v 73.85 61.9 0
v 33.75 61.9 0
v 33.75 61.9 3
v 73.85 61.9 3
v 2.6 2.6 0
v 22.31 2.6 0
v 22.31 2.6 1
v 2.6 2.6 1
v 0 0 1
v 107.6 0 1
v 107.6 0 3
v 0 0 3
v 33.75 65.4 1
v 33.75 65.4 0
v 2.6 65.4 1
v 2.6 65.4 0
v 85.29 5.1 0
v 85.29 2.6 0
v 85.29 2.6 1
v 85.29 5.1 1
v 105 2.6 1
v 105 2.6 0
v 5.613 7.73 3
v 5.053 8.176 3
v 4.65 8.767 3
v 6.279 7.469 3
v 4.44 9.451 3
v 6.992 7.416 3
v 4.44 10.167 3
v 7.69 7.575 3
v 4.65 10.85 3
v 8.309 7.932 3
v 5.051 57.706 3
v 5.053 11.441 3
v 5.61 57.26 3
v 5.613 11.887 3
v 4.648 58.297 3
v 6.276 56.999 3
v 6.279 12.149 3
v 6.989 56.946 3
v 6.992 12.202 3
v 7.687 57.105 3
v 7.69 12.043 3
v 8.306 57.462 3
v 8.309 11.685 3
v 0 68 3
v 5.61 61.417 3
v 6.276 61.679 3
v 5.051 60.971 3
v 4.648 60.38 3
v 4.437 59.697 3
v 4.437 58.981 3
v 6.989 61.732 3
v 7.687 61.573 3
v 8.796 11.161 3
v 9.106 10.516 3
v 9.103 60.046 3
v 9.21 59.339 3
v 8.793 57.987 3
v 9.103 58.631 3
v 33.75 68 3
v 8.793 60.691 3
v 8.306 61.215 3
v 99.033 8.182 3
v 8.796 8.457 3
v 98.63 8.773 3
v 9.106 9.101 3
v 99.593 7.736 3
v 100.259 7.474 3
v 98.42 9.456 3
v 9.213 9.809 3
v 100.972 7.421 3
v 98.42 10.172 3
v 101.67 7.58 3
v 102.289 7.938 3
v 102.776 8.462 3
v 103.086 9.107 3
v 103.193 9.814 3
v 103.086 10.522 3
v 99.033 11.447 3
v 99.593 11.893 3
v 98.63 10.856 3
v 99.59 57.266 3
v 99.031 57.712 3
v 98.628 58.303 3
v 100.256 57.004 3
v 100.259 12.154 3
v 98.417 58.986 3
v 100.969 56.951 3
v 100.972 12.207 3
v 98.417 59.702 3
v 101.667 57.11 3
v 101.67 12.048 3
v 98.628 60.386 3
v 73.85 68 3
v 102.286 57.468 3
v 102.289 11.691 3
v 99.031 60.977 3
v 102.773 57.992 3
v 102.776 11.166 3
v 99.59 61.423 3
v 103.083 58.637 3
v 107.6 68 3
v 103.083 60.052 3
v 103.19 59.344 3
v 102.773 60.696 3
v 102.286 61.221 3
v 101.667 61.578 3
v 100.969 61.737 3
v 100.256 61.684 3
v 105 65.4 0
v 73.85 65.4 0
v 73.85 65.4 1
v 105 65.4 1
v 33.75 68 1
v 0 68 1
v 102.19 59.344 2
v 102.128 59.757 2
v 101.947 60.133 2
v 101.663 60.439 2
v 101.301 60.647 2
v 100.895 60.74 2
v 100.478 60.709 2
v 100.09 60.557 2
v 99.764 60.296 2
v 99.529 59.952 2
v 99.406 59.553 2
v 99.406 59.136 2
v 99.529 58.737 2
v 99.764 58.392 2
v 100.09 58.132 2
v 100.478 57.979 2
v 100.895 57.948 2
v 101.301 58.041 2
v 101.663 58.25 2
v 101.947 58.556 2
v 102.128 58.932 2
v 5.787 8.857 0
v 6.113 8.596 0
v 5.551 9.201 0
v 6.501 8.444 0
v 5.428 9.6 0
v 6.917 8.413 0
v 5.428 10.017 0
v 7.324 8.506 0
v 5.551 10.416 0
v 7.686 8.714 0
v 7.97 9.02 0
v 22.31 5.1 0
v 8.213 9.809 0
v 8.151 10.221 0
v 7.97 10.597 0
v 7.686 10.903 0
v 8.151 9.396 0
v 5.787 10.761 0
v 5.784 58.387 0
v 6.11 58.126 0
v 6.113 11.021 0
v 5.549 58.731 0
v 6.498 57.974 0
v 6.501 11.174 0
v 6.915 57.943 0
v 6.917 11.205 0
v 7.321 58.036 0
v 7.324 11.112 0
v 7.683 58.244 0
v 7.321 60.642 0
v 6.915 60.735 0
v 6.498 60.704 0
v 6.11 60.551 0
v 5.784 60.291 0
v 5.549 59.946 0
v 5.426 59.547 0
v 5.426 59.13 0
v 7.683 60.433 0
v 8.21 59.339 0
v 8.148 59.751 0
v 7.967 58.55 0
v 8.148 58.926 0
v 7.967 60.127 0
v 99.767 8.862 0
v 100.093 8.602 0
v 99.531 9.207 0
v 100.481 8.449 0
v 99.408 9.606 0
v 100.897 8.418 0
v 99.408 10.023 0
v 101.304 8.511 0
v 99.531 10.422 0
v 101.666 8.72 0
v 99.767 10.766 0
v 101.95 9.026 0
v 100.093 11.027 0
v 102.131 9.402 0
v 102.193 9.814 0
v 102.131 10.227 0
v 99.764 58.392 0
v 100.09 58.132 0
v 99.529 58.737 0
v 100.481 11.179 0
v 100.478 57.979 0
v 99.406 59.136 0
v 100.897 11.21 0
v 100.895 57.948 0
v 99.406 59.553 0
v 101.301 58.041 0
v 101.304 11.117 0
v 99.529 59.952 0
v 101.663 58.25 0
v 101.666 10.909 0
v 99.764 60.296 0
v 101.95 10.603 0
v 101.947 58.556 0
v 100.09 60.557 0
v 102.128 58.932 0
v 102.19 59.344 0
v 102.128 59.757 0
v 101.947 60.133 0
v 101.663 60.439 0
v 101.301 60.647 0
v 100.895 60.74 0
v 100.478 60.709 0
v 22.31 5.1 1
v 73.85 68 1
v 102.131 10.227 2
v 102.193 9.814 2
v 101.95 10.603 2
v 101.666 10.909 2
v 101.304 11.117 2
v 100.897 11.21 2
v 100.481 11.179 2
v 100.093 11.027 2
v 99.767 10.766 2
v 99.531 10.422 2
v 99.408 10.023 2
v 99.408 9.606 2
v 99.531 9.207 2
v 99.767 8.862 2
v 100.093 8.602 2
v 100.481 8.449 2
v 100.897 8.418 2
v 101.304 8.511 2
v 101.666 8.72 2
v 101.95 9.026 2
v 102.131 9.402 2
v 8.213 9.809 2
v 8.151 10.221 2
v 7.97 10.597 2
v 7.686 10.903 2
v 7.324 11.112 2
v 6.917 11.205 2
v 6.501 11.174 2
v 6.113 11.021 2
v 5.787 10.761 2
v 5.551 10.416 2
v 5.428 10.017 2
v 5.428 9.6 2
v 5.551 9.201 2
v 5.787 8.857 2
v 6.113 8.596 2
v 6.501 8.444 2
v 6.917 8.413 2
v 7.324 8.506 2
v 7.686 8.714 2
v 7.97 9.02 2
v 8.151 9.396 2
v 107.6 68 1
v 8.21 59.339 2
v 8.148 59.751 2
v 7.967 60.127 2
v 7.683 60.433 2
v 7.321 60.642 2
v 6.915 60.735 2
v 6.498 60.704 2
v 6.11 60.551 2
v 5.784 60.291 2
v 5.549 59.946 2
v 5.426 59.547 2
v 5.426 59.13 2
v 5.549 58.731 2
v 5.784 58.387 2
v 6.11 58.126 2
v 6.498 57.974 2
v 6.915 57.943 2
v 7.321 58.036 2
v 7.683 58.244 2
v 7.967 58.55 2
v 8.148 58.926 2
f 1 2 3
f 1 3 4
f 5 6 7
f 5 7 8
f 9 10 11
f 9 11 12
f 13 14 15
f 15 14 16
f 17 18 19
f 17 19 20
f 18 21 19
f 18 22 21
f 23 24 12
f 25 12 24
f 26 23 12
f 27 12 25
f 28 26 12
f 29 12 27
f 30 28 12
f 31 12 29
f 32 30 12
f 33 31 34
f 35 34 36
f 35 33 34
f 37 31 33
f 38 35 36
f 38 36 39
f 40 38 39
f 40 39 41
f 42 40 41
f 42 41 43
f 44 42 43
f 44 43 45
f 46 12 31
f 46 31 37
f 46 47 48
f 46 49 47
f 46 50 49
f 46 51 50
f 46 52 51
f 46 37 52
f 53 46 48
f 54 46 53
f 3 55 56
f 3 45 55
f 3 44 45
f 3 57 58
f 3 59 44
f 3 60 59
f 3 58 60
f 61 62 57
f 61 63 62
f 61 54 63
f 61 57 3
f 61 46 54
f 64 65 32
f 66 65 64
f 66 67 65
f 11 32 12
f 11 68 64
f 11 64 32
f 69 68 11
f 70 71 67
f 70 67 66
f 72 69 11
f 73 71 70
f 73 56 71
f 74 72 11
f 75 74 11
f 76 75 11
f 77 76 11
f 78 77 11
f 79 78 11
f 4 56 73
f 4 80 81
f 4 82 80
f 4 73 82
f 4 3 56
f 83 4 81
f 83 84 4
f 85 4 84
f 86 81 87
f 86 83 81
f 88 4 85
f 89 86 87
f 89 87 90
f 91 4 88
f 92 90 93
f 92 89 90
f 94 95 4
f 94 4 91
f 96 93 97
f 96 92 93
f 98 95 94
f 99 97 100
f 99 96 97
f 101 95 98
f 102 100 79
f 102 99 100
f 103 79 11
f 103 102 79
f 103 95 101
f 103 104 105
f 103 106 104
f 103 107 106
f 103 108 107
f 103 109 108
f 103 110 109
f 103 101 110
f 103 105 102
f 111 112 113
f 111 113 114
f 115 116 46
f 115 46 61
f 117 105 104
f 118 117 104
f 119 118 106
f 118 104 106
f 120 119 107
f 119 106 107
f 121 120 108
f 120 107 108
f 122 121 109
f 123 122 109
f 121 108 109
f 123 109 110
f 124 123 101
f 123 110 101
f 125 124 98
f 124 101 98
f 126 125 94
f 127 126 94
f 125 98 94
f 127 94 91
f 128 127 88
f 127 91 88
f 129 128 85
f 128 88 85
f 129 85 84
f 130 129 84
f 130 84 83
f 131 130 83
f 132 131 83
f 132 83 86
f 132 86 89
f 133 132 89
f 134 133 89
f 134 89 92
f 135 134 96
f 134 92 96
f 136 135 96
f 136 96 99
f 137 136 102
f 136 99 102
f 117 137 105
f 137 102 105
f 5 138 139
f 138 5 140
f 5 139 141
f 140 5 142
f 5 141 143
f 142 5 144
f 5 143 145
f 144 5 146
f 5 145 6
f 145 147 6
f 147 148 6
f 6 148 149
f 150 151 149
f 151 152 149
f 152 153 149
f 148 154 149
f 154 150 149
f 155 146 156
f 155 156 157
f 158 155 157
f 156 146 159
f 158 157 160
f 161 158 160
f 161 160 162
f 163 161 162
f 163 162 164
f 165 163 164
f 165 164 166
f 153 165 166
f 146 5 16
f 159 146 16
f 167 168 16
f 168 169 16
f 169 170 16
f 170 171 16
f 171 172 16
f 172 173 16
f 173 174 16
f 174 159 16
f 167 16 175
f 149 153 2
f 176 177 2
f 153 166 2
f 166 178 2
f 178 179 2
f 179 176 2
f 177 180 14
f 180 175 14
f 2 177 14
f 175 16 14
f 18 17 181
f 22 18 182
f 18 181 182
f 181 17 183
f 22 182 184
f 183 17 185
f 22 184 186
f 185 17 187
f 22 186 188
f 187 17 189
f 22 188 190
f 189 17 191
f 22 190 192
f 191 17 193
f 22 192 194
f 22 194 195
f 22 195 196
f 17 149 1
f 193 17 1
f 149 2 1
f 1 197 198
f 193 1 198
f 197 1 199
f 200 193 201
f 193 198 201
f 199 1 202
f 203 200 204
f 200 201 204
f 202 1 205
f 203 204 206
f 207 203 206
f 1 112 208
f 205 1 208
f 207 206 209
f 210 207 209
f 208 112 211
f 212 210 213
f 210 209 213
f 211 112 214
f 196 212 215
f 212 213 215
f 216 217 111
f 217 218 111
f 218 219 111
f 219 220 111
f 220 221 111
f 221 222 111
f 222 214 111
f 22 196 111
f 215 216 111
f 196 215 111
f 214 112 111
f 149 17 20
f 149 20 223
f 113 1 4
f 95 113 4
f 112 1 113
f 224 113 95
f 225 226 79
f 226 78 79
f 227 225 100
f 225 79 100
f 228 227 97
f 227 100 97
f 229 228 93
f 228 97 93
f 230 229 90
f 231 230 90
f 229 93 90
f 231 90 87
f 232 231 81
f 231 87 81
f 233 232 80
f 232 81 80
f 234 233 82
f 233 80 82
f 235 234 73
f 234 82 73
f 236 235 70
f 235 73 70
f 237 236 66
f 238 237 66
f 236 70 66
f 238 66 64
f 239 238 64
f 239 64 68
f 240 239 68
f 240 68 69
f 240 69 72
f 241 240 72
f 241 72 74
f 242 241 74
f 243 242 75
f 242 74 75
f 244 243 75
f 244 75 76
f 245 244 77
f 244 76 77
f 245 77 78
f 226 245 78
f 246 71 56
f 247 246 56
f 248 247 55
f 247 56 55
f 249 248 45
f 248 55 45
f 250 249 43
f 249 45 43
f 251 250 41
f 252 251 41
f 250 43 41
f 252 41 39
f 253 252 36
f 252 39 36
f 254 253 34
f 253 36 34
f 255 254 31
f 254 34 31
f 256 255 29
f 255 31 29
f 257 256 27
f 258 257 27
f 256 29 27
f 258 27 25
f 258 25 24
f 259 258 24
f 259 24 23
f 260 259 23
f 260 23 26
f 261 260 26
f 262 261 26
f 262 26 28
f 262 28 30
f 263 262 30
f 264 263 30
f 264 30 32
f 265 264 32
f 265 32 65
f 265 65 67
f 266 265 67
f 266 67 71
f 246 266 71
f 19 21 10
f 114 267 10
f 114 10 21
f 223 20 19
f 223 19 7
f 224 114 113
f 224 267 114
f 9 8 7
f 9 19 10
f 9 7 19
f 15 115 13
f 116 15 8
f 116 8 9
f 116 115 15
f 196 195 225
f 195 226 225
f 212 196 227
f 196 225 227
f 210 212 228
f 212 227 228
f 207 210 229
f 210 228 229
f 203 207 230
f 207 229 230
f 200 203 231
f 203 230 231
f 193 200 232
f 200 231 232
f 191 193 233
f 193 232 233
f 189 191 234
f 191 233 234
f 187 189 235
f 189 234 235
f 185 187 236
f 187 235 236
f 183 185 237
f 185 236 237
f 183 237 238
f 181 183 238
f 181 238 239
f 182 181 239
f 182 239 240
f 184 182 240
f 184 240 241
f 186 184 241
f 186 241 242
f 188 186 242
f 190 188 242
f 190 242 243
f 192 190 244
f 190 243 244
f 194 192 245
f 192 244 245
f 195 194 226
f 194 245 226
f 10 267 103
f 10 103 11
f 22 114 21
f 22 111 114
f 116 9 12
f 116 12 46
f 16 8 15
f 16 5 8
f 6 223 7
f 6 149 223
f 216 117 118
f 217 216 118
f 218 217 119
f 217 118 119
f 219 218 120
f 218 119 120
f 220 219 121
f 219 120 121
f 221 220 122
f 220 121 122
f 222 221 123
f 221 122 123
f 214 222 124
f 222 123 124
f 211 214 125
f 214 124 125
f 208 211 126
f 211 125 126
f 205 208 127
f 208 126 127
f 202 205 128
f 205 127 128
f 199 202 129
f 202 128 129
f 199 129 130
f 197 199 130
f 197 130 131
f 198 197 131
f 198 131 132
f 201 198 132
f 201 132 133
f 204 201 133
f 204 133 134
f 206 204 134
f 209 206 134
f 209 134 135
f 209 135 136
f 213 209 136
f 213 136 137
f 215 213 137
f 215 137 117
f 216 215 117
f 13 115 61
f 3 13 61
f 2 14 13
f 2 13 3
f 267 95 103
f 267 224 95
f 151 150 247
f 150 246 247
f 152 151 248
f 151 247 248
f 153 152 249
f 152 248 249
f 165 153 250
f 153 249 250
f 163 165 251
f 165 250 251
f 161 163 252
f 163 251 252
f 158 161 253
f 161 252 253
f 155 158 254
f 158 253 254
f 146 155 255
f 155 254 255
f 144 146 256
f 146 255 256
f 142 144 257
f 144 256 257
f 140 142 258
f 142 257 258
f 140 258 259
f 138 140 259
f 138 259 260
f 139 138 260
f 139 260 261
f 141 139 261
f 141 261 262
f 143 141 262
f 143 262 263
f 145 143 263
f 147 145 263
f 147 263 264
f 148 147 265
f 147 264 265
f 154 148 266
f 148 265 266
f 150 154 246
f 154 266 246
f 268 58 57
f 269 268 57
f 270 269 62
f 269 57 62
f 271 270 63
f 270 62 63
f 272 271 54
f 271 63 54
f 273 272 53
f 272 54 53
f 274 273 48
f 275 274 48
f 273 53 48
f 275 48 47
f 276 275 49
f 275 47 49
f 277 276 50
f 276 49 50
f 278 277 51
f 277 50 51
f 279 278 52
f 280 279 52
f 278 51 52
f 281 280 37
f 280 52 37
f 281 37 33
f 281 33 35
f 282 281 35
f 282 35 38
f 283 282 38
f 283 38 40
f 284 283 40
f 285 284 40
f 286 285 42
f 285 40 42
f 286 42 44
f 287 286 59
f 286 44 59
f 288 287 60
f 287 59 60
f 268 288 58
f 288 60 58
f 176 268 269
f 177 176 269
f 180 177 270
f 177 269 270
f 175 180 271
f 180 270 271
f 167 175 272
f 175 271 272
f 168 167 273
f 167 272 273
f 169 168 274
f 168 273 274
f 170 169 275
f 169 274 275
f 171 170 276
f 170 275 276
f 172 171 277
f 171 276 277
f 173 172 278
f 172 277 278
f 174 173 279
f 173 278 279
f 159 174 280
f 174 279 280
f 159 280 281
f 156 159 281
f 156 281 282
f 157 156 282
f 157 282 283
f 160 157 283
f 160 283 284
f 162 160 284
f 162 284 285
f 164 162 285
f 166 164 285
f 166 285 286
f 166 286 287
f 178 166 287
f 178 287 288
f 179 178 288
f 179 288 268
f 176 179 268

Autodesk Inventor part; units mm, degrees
ref_plane "YZ Plane" through (0, 0, 0) normal (1, 0, 0) x (0, 1, 0)
ref_plane "XZ Plane" through (0, 0, 0) normal (0, 1, 0) x (-1, 0, 0)
ref_plane "XY Plane" through (0, 0, 0) normal (0, 0, 1) x (1, 0, 0)
sketch "Sketch1" plane through (0, 0, 0) normal (0, 0, 1) x (1, 0, 0)
  line L0 (107.6, 68) -> (107.6, 0)
  line L1 (107.6, 0) -> (0, 0)
  line L2 (0, 0) -> (0, 68)
  line L3 (0, 68) -> (33.75, 68)
  line L4 (33.75, 68) -> (33.75, 61.9)
  line L5 (33.75, 61.9) -> (73.85, 61.9)
  line L6 (73.85, 61.9) -> (73.85, 68)
  line L7 (73.85, 68) -> (107.6, 68)
  line L8 (53.8, 0) -> (53.8, -26.1159) construction
  line L9 (53.8, 61.9) -> (53.8, 35.6829) construction
  dimension "d37" = 40.1
  dimension "d38" = 107.6
  dimension "d39" = 68
  dimension "d64" = 6.1
extrude "Extrusion1" add sketch "Sketch1" along normal blind 3
sketch "Sketch4" plane through (0, 0, 0) normal (0, 0, -1) x (-1, 0, 0)
  line L0 (-33.75, 68) -> (0, 68) projected
  line L1 (-33.75, 61.9) -> (-33.75, 68) projected
  line L2 (-73.85, 61.9) -> (-33.75, 61.9) projected
  line L3 (-73.85, 68) -> (-73.85, 61.9) projected
  line L4 (-107.6, 68) -> (-73.85, 68) projected
  line L5 (-107.6, 0) -> (-107.6, 68) projected
  line L6 (0, 0) -> (-107.6, 0) projected
  line L7 (0, 68) -> (0, 0) projected
  line L8 (-71.25, 65.4) -> (-71.25, 63.4)
  line L9 (-71.25, 63.4) -> (-36.35, 63.4)
  line L10 (-36.35, 63.4) -> (-36.35, 65.4)
  line L11 (-36.35, 65.4) -> (-2.6, 65.4)
  line L12 (-71.25, 65.4) -> (-105, 65.4)
  line L13 (-105, 65.4) -> (-105, 2.6)
  line L14 (-2.6, 2.6) -> (-2.6, 65.4)
  line L15 (-105, 2.6) -> (-85.29, 2.6)
  line L16 (-85.29, 2.6) -> (-85.29, 5.1)
  line L17 (-85.29, 5.1) -> (-22.31, 5.1)
  line L18 (-22.31, 5.1) -> (-22.31, 2.6)
  line L19 (-22.31, 2.6) -> (-2.6, 2.6)
  line L20 (-53.8, 0) -> (-53.8, 2.6) construction
  line L21 (-53.8, 5.1) -> (-53.8, 2.6) construction
  dimension "d42" = 2.6
  dimension "d43" = 2.6
  dimension "d44" = 2.6
  dimension "d45" = 2.6
  dimension "d46" = 2.6
  dimension "d48" = 2.6
  dimension "d49" = 5.1
  dimension "d50" = 2.6
  dimension "d51" = 2.6
  dimension "d52" = 62.98
  dimension "d65" = 2
extrude "Extrusion4" cut sketch "Sketch4" against normal blind 1 contours L0 L7 L6 L5 L4 L3 L12 L13 L15 L16 L17 L18 L19 L14 L11 L1
sketch "Sketch5" plane through (0, 0, 3) normal (0, 0, 1) x (1, 0, 0)
  circle A0 centre (6.8128, 9.8088) radius 1.5 projected
  circle A1 centre (6.81, 59.3388) radius 1.5 projected
  circle A2 centre (100.7928, 9.8142) radius 1.5 projected
  circle A3 centre (100.79, 59.3442) radius 1.5 projected
  line L0 (104.603, 6.0044) -> (3.003, 5.9986) projected
  line L1 (104.5998, 63.1544) -> (104.603, 6.0044) projected
  line L2 (2.9998, 63.1486) -> (104.5998, 63.1544) projected
  line L3 (3.003, 5.9986) -> (2.9998, 63.1486) projected
  circle A4 centre (6.81, 59.3388) radius 1.4
  circle A5 centre (6.8128, 9.8088) radius 1.4
  circle A6 centre (100.7928, 9.8142) radius 1.4
  circle A7 centre (100.79, 59.3442) radius 1.4
  point P0 (0, 0)
  dimension "d55" = 2.8
  dimension "d56" = 2.8
  dimension "d57" = 2.8
  dimension "d58" = 2.8
extrude "Extrusion5" cut sketch "Sketch5" against normal blind 4 contours A4 | A5 | A6 | A7
chamfer "Chamfer3" distance 1 angle 45 4 edges at (5.41, 59.3388, 3) (5.4128, 9.8088, 3) (99.39, 59.3442, 3) (99.3928, 9.8142, 3)
properties part number "Enclosure-Backplate01"
